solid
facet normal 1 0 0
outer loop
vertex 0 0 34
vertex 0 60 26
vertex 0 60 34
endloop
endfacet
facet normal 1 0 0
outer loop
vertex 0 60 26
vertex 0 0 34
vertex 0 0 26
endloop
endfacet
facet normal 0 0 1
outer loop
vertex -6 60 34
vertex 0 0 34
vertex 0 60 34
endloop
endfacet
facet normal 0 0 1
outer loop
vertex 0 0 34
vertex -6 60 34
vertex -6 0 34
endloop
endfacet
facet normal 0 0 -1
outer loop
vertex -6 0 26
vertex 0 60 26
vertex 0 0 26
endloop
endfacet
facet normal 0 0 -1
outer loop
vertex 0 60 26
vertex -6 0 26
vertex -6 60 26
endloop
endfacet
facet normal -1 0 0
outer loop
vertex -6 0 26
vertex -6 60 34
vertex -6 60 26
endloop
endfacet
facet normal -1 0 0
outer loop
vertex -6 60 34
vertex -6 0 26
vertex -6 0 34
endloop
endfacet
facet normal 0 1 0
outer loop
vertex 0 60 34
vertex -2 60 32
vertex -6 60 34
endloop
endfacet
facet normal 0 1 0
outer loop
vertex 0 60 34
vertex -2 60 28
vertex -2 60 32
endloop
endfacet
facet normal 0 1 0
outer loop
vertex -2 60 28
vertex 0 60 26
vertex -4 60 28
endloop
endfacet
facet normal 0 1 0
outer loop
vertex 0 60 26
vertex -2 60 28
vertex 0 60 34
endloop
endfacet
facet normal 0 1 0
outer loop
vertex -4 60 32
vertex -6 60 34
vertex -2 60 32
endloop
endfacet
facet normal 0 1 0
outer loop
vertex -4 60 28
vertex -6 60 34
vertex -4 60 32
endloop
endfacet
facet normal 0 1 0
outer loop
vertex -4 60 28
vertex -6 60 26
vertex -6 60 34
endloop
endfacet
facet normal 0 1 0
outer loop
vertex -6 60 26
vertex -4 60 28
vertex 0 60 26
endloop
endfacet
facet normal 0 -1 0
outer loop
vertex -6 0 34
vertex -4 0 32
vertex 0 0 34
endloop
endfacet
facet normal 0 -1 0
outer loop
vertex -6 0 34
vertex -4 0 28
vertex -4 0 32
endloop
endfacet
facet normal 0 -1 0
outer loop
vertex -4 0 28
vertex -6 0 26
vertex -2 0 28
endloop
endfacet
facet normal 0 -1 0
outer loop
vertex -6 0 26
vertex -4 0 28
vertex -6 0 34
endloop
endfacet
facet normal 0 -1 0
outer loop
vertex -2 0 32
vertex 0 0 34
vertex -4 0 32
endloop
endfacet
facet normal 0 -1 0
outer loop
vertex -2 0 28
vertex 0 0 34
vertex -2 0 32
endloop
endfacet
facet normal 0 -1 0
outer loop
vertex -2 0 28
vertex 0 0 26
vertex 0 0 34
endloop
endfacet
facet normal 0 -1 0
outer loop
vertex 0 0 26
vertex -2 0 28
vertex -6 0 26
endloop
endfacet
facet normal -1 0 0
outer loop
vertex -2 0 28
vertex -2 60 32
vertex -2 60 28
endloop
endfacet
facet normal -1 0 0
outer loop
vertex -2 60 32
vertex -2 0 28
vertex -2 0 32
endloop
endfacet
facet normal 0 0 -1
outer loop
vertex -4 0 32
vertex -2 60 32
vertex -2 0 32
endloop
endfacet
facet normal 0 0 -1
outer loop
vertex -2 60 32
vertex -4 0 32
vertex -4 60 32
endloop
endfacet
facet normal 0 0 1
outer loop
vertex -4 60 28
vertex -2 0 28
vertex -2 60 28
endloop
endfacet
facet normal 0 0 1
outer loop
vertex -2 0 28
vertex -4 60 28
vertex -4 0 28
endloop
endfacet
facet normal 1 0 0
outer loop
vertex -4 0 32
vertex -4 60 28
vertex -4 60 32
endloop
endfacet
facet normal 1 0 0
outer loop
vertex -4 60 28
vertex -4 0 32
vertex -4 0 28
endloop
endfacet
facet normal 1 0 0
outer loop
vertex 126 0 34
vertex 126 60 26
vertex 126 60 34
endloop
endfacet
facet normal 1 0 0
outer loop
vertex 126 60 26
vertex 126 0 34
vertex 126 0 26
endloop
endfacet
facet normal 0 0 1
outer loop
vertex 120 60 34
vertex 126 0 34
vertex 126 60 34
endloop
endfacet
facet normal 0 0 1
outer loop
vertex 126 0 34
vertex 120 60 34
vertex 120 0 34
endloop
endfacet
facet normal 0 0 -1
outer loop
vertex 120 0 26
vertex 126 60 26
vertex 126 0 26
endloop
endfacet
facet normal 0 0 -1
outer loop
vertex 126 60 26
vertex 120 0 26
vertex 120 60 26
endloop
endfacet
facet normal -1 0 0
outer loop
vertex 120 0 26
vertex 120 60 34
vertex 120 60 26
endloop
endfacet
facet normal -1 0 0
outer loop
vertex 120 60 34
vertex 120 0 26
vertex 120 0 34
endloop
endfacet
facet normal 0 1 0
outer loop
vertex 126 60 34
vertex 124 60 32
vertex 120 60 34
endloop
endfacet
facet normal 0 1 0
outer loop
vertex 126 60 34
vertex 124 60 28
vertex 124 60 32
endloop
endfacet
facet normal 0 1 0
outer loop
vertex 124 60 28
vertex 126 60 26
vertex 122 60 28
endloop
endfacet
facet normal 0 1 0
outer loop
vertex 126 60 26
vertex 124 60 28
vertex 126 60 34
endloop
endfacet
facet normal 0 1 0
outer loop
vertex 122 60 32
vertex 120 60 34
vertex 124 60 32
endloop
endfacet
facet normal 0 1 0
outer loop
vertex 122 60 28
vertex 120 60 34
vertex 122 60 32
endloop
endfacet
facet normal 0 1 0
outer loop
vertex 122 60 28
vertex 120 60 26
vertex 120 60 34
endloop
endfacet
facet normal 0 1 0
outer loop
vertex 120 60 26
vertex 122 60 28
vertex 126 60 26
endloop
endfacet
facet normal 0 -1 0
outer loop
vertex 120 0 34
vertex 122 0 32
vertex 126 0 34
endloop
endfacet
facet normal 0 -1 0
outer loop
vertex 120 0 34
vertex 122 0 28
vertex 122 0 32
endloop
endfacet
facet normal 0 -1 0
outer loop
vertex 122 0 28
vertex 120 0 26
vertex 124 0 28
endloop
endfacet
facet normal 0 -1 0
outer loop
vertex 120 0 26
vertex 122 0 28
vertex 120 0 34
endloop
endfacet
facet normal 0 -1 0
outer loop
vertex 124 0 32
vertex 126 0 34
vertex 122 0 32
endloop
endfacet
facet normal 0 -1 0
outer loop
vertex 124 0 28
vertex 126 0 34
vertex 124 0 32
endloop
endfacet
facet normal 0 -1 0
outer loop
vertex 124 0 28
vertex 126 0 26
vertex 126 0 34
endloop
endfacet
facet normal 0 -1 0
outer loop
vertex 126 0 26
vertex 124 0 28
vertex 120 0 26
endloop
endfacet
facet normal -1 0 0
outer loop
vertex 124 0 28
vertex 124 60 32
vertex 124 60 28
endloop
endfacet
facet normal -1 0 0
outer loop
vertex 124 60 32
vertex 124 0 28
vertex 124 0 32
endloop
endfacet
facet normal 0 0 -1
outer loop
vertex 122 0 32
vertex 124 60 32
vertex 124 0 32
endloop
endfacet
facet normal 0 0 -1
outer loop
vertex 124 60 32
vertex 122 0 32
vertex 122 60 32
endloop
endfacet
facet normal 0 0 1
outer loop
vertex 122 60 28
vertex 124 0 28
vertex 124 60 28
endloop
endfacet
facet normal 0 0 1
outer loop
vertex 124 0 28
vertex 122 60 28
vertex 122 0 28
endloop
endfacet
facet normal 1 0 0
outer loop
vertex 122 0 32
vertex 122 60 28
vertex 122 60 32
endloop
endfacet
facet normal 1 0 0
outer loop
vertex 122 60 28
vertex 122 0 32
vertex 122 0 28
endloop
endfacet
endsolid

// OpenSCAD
// file: ../../lib/logic.scad
use <./strings.scad>

function int(s, total=0, i=0) = (i == len(s))
  ? total
  : int(s, total*10 + ord(s[i]) - ord("0"), i+1);

function frac(s) = int(s) / pow(10, len(s));

function num(s) =
  let (parts = split(s, "."))
  len(parts) == 1
  ? int(parts[0])
  : int(parts[0]) + frac(parts[1]);

function any(list, i=0) = (i == len(list))
  ? false
  : list[i] || any(list, i+1);

function all(list, i=0) = (i == len(list))
  ? true
  : list[i] && all(list, i+1);

function is_int_string(s) = all([for(c=s) "0" <= c && c <= "9"]);

function is_num_string(s) =
  let (parts = split(s, "."))
  len(parts) == 1
  ? is_int_string(parts[0])
  : len(parts) == 2
    ? is_int_string(parts[0]) && is_int_string(parts[1])
    : false;

function _test_logic() =
  assert (int("123") == 123)
  assert (int("9999") == 9999)
  assert (frac("5") == 0.5)
  assert (frac("33333") == 0.33333)
  assert (frac("111111") == 0.111111)
  assert (frac("02") == 0.02)
  assert (frac("020000") == 0.02)
  assert (frac("0") == 0)
  assert (frac("0000000000000") == 0)
  assert (frac("0000000000001") == 0.0000000000001)
  assert (num("123") == 123)
  assert (num("2.75") == 2.75)
  assert (num("1234.991230149") == 1234.991230149) // I'm kinda shocked that works
  assert (any([false, "", 0, []]) == false)
  assert (any([false, "", 0, [], 1]) == true)
  assert (any([]) == false)
  assert (all([1, true, "a"]) == true)
  assert (all([1, true, "a", ""]) == false)
  assert (all([]) == true)
  assert (is_int_string("1234") == true)
  assert (is_int_string("093999914") == true)
  assert (is_int_string("123A") == false)
  assert (is_int_string("two") == false)
  assert (is_int_string("2.6") == false)
  assert (is_num_string("2.6") == true)
  assert (is_num_string("1241422.5522106") == true)
  assert (is_num_string("124142205522106") == true)
  assert (is_num_string("1241422,5522106") == false)
  assert (is_num_string("1241422.552.106") == false)
  assert (is_num_string("1241422Q") == false)
  "test logic success";

echo(_test_logic());
// file: ../../lib/props.scad
use <./logic.scad>
use <./strings.scad>

// Global prop function.
// The idea here is to define a function like:
//   function prop(key) = getprop(key, global_props);
// and then use that to share variables throughout your multi-file design.
// A bunch of expressions are available within the props dictionary, like
// references to other props, and various computations. Whitespace
// is strict in the expressions.
props_example = [
  ["key1", 1],
  ["key2", 2],
  ["key3", 3],
  ["key4", "$key3 * 20"],
  ["namespace.value1", 8],
  ["namespace.value2", "$key2"],
  ["othernamespace.value1", "$namespace.value2"],
  ["s", "hello"],
  ["e1", "$key3 / 2"],
  ["e2", "$namespace.value2 + 1.275"],
  ["e3", "$othernamespace.value1 * 6"],
  ["e4", "$key2 ^ 6"],
  ["e5", "$key3 % 2"],
  ["e6", "cos $key4"],
  ["p1", "$key3 * ($key2 + $key1)"],
  ["p2", "(1 + 2) * (2 ^ 3)"],
  ["p3", "((1 + $e5) + 1) + (cos $key4)"],
  ["zero", 0],
  ["false", false],
  ["undef", undef],
  ["empty-array", []],
];

function eval_literal(args) =
  // compute things like `2 + 4` or `cos 45`
  len(args) == 0 ? undef :
  args[0] == "norm" ? norm([for(i=[1:len(args)-1]) args[i]]) :
  len(args) == 3
  ? args[1] == "/" ? args[0] / args[2]
    : args[1] == "*" ? args[0] * args[2]
    : args[1] == "+" ? args[0] + args[2]
    : args[1] == "-" ? args[0] - args[2]
    : args[1] == "^" ? args[0] ^ args[2]
    : args[1] == "%" ? args[0] % args[2]
    : undef
  : len(args) == 2
    ? args[0] == "sin" ? sin(args[1])
      : args[0] == "cos" ? cos(args[1])
      : args[0] == "tan" ? tan(args[1])
      : args[0] == "asin" ? asin(args[1])
      : args[0] == "acos" ? acos(args[1])
      : args[0] == "atan" ? atan(args[1])
      : args[0] == "sqrt" ? sqrt(args[1])
      : undef
    : len(args) == 1
      ? args[0]
      : undef;

function eval_raw(expression, props) =
  // resolve types and props in expressions, like "(cos $thing) * ($other / 3)"
  // note that whitespace is not ignored
  !is_string(expression)
  ? expression
  : !contains(expression, "(")
    ? // simple expression like "$thing + 5"
      eval_literal([
        for (arg=split(expression))
          arg[0] == "$"
          ? getprop(substr(arg, start=1), props)
          : is_num_string(arg)
            ? num(arg)
            : arg
      ])
    : // resolve the innermost parens and start again
      let (inner_start = last(expression, "("),
           inner_end = first(expression, ")", after=inner_start),
           inner = eval_raw(substr(expression, inner_start+1, inner_end), props))
      eval_raw(replace_substr(expression, inner, inner_start, inner_end+1), props);

function getprop(key, props) =
  let (prop = props[search([key], props)[0]][1])
  assert (prop != undef, str("Missing key in properties: ", key))
  let (result = eval_raw(prop, props))
  assert (result != undef, str("Invalid expression in properties: ", prop))
  result;

function _test_props() =
  assert (getprop("key3", props_example) == 3)
  assert (getprop("namespace.value2", props_example) == 2)
  assert (getprop("e1", props_example) == 1.5)
  assert (getprop("e2", props_example) == 3.275)
  assert (getprop("e3", props_example) == 12)
  assert (getprop("e4", props_example) == 64)
  assert (getprop("e5", props_example) == 1)
  assert (getprop("e6", props_example) == 0.5)
  assert (getprop("p1", props_example) == 9)
  assert (getprop("p2", props_example) == 24)
  assert (getprop("p3", props_example) == 3.5)
  assert (getprop("s", props_example) == "hello")
  assert (getprop("zero", props_example) == 0)
  assert (getprop("false", props_example) == false)
  assert (getprop("empty-array", props_example) == [])
  "test props success";

echo(_test_props());
// file: ../../lib/strings.scad
function contains(list, item, i=0) = (i == len(list))
  ? false
  : list[i] == item || contains(list, item, i+1);

function strcat(char_array, i=0, r="") = (i == len(char_array))
  ? r
  : strcat(char_array, i+1, str(r, char_array[i]));

function substr(s, start=0, limit=undef) =
  // return str[i] where start <= i < limit
  let (end = limit == undef ? len(s)-1 : min(limit-1, len(s)-1))
  end < start
  ? ""
  : strcat([for (i=[start:end]) s[i]]);

function contains_substr(s, sub) =
  // return true if substr is found anywhere in s
  let (list = [for (i=[0:1:len(s)-len(sub)]) substr(s, start=i, limit=i+len(sub))])
  contains(list, sub);

function replace_substr(s, repl, start=0, limit=undef) =
  // remove a substring and replace it with another string
  let (end = limit == undef ? len(s)-1 : limit-1)
  str(substr(s, limit=start), repl, substr(s, start=end+1));

function split(s, separator=" ", parts=[]) =
  let (match=search(separator, s, 0)[0])
  match == []
  ? concat(parts, [s])
  : split(substr(s, start=match[0]+1), separator, concat(parts, [substr(s, limit=match[0])]));

function first(string, char, after=-1) =
  let (result = search(char, substr(string, start=after+1), 1))
  result == []
  ? undef
  : result[0] + after+1;

function last(string, char) =
  let (result=search(char, string, 0))
  result == []
  ? undef
  : result[0][len(result[0])-1];

function _test_strings() =
  assert (contains("abcd", "d") == true)
  assert (contains("abcd", "Q") == false)
  assert (contains([1, 2, 3, 4], 1) == true)
  assert (contains([1, 2, 3, 4], 5) == false)
  assert (contains([["a"], 2, [], ""], []) == true)
  assert (contains([["a"], 2, [], ""], ["a"]) == true)
  assert (contains([["a"], 2, [], ""], ["b"]) == false)
  assert (strcat([]) == "")
  assert (strcat(["a"]) == "a")
  assert (strcat(["a", "b"]) == "ab")
  assert (strcat(["a", "", "b"]) == "ab")
  assert (substr("abcde") == "abcde")
  assert (substr("abcde", start=0) == "abcde")
  assert (substr("abcde", start=1) == "bcde")
  assert (substr("abcde", limit=3) == "abc")
  assert (substr("abcde", start=2, limit=4) == "cd")
  assert (substr("abcde", start=99) == "")
  assert (contains_substr("abcde", "a") == true)
  assert (contains_substr("abcde", "ab") == true)
  assert (contains_substr("abcde", "abcde") == true)
  assert (contains_substr("abcde", "de") == true)
  assert (contains_substr("abcde", "Q") == false)
  assert (contains_substr("abcde", "abcdefghijklmnop") == false)
  assert (contains_substr("abcde", "e*") == false)
  assert (contains_substr("abcde", "") == true)
  assert (replace_substr("abcde", "CD", start=2, limit=4) == "abCDe")
  assert (replace_substr("abcde", "CD", start=2, limit=5) == "abCD")
  assert (replace_substr("abcde", "CD", start=2, limit=999) == "abCD")
  assert (replace_substr("abcde", "CD", start=2) == "abCD")
  assert (replace_substr("abcde", "AAA", start=0) == "AAA")
  assert (replace_substr("abcde", "AAA") == "AAA")
  assert (replace_substr("abcde", "III", limit=0) == "IIIabcde")
  assert (replace_substr("abcde", "III", start=3, limit=3) == "abcIIIde")
  assert (replace_substr("abcde", "III", start=5) == "abcdeIII")
  assert (replace_substr("abcde", "III", start=999) == "abcdeIII")
  assert (split("abc,defg,hi", ",") == ["abc", "defg", "hi"])
  assert (split("abc,defg,hi", "#") == ["abc,defg,hi"])
  assert (split(",,ab,c,,d,efg", ",") == ["", "", "ab", "c", "", "d", "efg"])
  assert (split("a b  cd ") == ["a", "b", "", "cd", ""])
  assert (split("abcd") == ["abcd"])
  assert (first("aaaaa", "a") == 0)
  assert (first("00aaa", "a") == 2)
  assert (first("0000a", "a") == 4)
  assert (first("0000a", "Z") == undef)
  assert (first("aaaaa", "a", after=2) == 3)
  assert (first("aaa00", "a", after=2) == undef)
  assert (first("a000a", "a", after=0) == 4)
  assert (first("a000a", "a", after=99) == undef)
  assert (last("aaaaa", "a") == 4)
  assert (last("aaa00", "a") == 2)
  assert (last("a0000", "a") == 0)
  assert (last("a0000", "Z") == undef)
  "test strings success";

echo(_test_strings());
// file: props.scad
use <../../lib/props.scad>

global_props = [
  // basic exterior dimensions
  ["bin.depth", 60],
  ["bin.width", 120],
  ["bin.front.height", 60],
  ["bin.back.height", 76],
  ["panel.thickness", 2],

  // lid/hinge
  ["lid.angle", "atan (($bin.back.height - $bin.front.height) / $bin.depth)"],
  ["lid.length", "norm $bin.depth ($bin.back.height - $bin.front.height)"],
  ["lid.cutout.radius", "$hinge.radius + $panel.thickness"],
  ["hinge.radius", 4],
  ["hinge.length", "$bin.width"],

  // hinge fin position
  ["hinge.fin.start", "$panel.thickness + 0.2"],
  ["hinge.fin.end", "$hinge.length - $hinge.fin.start"],
  ["hinge.fin.count", 5],

  // hinge fin shape
  ["hinge.fin.length", "$lid.length - $panel.thickness"],
  ["hinge.fin.width", 2.31],
  ["hinge.fin.height", "$hinge.radius * 2"],
  ["hinge.fin.taper.angle", 40],
  ["hinge.fin.margin", 0.2],

  // hinge pin
  ["hinge.pin.radius", 2],
  ["hinge.pin.margin", 0.2],
  ["hinge.pin.start", "$panel.thickness / 2"],
  ["hinge.pin.end", "$hinge.length - $hinge.pin.start"],
];

function prop(key) = getprop(key, global_props);
// file: ../../lib/shapes.scad
use <./strings.scad>

$fa = $preview ? 1 : .1;
$fs = $preview ? 1 : .1;

// Beginnings of a 3d shapes library. I want shapes with a "margin" property
// and possibly specific overrides for margins in a particular direction.
// The idea is to add a thickness around the outside of the entire shape
// without changing the center of the shape. This can be used with
// `difference` to carve out space for shapes to fit, with adjustable
// tolerance.

// given on="x+,y+" or whatever, figure out the translation vector
function _t(on, x=0, y=0, z=0) = 
  let(t = split(on, ","))
  (contains(t, "x+") ? [ x, 0, 0] : [0, 0, 0]) +
  (contains(t, "x-") ? [-x, 0, 0] : [0, 0, 0]) +
  (contains(t, "y+") ? [0,  y, 0] : [0, 0, 0]) +
  (contains(t, "y-") ? [0, -y, 0] : [0, 0, 0]) +
  (contains(t, "z+") ? [0, 0,  z] : [0, 0, 0]) +
  (contains(t, "z-") ? [0, 0, -z] : [0, 0, 0]);

module prism(
  n=undef,
  r=undef, side=undef, // must specify one of r or side length
  z=undef, // thickness (in z direction)
  on="origin", // placement: origin | x+ | z+,y- | etc
  margin=0,       // global margin
  margin_r=undef, margin_side=undef, // override r margin
  margin_z=undef, // override z margin
  chamfer=0,
) {
  a = 180/n;
  margin_side = margin_side == undef ? margin : margin_side;
  margin_r = margin_r == undef ? margin_side/cos(a) : margin_r;
  margin_z = margin_z == undef ? margin : margin_z;
  r = r == undef ? side/(2*sin(a)) : r;
  translate(_t(on, y=r*cos(a), z=z/2))
    rotate([0, 0, 90 - (n%2 == 0 ? a : 0)])
      if (chamfer > 0) {
        // chamfer should be measured in distance perpendicular to the side, which is at
        // angle `a` from `r` (i.e. the same angle we have to rotate if n is odd.
        cz = chamfer;
        cr = chamfer/cos(a);
        // TODO chamfer should depend on the margin, but it's pretty tedious
        // for a small gain
        translate([0, 0, (z + 2*margin_z - cz)/2])
          cylinder(h=cz, r1=r + margin_r, r2=r + margin_r - cr, $fn=n, center=true);
        cylinder(h=z + 2*margin_z - 2*cz, r=r + margin_r, $fn=n, center=true);
        translate([0, 0, -(z + 2*margin_z - cz)/2])
          cylinder(h=cz, r2=r + margin_r, r1=r + margin_r - cr, $fn=n, center=true);
      } else {
        cylinder(h=z + 2*margin_z, r=r + margin_r, $fn=n, center=true);
      }
}



//difference() {
//  %prism(n=5, r=8, z=4, chamfer=1, on="y+,z-", margin=1);
//  prism(n=5, r=8, z=4, chamfer=1, on="y+,z-");
//}

module box(
  x=undef, y=undef, z=undef,  // 3 ways to specify size
  on="origin", // placement: origin | x+ | z+,y- | etc
  margin=0, // global margin
  margin_x=undef,  // override margins
  margin_y=undef,
  margin_z=undef,
  chamfer=0, // flatten the corners
) {
  s = is_num(z)  ? [x, y, z]  // size: x=num, y=num, z=num
    : is_list(x) ? x          //   or: x=[num, num, num]
    : [x, x, x];              //   or: x=num
  m = [
    margin_x == undef ? margin : margin_x,
    margin_y == undef ? margin : margin_y,
    margin_z == undef ? margin : margin_z
  ];

  translate(_t(on, x=s.x/2, y=s.y/2, z=s.z/2))
    if (chamfer > 0) {
      // This looks pretty wild, but I just want to maintain a minimum margin
      // in each of the specified directions from the chamfer, so to keep the
      // chamfer angles all at 45, you need take the smallest chamfer out of
      // the big shape (box + margins) that maintains the right margin
      // distance in each direction.
      cyz = 2*(min(m.y, m.z) + chamfer);
      cxz = 2*(min(m.x, m.z) + chamfer);
      cxy = 2*(min(m.x, m.y) + chamfer);
      intersection() {
        cube(s + 2*m, center=true);
        rotate([45,0,0])
          cube([
            s.x + 2*m.x + 1,
            (s.y + 2*m.y + s.z + 2*m.z - cyz)/sqrt(2),
            (s.y + 2*m.y + s.z + 2*m.z - cyz)/sqrt(2)
          ], center=true);
        rotate([0,45,0])
          cube([
            (s.x + 2*m.x + s.z + 2*m.z - cxz)/sqrt(2),
            s.y + 2*m.y + 1,
            (s.x + 2*m.x + s.z + 2*m.z - cxz)/sqrt(2)
          ], center=true);
        rotate([0,0,45])
          cube([
            (s.x + 2*m.x + s.y + 2*m.y - cxy)/sqrt(2),
            (s.x + 2*m.x + s.y + 2*m.y - cxy)/sqrt(2),
            s.z + 2*m.z + 1
          ], center=true);
      }
    } else {
      cube(s + 2*m, center=true);
    }
}

//difference() {
//  box(10, 20, 30, chamfer=4, margin=1, margin_x=2);
//  box(10, 20, 30, chamfer=4);
//  // see through to the chamfer on different margins
//  color("red") box(100, on="z+");
//}

//box(1, chamfer=.1, on="z+,x-");
//%box(x=10, y=10, z=.1, on="z+,x-");
// main file
use <../../lib/shapes.scad>
use <props.scad>

module arms(
  w=prop("bin.width"),
  fh=prop("bin.front.height"),
  d=prop("bin.depth"),
  t=prop("panel.thickness"),
) {
  translate([0, 0, fh/2]) {
    difference() {
      box(x=3*t, y=d, z=4*t, on="x-,y+");
      box(x=3*t, y=d, z=4*t, on="x-,y+", margin=-t, margin_y=1);
    }
    translate([w, 0, 0])
      difference() {
        box(x=3*t, y=d, z=4*t, on="x+,y+");
        box(x=3*t, y=d, z=4*t, on="x+,y+", margin=-t, margin_y=1);
      }
  }
};

arms();
